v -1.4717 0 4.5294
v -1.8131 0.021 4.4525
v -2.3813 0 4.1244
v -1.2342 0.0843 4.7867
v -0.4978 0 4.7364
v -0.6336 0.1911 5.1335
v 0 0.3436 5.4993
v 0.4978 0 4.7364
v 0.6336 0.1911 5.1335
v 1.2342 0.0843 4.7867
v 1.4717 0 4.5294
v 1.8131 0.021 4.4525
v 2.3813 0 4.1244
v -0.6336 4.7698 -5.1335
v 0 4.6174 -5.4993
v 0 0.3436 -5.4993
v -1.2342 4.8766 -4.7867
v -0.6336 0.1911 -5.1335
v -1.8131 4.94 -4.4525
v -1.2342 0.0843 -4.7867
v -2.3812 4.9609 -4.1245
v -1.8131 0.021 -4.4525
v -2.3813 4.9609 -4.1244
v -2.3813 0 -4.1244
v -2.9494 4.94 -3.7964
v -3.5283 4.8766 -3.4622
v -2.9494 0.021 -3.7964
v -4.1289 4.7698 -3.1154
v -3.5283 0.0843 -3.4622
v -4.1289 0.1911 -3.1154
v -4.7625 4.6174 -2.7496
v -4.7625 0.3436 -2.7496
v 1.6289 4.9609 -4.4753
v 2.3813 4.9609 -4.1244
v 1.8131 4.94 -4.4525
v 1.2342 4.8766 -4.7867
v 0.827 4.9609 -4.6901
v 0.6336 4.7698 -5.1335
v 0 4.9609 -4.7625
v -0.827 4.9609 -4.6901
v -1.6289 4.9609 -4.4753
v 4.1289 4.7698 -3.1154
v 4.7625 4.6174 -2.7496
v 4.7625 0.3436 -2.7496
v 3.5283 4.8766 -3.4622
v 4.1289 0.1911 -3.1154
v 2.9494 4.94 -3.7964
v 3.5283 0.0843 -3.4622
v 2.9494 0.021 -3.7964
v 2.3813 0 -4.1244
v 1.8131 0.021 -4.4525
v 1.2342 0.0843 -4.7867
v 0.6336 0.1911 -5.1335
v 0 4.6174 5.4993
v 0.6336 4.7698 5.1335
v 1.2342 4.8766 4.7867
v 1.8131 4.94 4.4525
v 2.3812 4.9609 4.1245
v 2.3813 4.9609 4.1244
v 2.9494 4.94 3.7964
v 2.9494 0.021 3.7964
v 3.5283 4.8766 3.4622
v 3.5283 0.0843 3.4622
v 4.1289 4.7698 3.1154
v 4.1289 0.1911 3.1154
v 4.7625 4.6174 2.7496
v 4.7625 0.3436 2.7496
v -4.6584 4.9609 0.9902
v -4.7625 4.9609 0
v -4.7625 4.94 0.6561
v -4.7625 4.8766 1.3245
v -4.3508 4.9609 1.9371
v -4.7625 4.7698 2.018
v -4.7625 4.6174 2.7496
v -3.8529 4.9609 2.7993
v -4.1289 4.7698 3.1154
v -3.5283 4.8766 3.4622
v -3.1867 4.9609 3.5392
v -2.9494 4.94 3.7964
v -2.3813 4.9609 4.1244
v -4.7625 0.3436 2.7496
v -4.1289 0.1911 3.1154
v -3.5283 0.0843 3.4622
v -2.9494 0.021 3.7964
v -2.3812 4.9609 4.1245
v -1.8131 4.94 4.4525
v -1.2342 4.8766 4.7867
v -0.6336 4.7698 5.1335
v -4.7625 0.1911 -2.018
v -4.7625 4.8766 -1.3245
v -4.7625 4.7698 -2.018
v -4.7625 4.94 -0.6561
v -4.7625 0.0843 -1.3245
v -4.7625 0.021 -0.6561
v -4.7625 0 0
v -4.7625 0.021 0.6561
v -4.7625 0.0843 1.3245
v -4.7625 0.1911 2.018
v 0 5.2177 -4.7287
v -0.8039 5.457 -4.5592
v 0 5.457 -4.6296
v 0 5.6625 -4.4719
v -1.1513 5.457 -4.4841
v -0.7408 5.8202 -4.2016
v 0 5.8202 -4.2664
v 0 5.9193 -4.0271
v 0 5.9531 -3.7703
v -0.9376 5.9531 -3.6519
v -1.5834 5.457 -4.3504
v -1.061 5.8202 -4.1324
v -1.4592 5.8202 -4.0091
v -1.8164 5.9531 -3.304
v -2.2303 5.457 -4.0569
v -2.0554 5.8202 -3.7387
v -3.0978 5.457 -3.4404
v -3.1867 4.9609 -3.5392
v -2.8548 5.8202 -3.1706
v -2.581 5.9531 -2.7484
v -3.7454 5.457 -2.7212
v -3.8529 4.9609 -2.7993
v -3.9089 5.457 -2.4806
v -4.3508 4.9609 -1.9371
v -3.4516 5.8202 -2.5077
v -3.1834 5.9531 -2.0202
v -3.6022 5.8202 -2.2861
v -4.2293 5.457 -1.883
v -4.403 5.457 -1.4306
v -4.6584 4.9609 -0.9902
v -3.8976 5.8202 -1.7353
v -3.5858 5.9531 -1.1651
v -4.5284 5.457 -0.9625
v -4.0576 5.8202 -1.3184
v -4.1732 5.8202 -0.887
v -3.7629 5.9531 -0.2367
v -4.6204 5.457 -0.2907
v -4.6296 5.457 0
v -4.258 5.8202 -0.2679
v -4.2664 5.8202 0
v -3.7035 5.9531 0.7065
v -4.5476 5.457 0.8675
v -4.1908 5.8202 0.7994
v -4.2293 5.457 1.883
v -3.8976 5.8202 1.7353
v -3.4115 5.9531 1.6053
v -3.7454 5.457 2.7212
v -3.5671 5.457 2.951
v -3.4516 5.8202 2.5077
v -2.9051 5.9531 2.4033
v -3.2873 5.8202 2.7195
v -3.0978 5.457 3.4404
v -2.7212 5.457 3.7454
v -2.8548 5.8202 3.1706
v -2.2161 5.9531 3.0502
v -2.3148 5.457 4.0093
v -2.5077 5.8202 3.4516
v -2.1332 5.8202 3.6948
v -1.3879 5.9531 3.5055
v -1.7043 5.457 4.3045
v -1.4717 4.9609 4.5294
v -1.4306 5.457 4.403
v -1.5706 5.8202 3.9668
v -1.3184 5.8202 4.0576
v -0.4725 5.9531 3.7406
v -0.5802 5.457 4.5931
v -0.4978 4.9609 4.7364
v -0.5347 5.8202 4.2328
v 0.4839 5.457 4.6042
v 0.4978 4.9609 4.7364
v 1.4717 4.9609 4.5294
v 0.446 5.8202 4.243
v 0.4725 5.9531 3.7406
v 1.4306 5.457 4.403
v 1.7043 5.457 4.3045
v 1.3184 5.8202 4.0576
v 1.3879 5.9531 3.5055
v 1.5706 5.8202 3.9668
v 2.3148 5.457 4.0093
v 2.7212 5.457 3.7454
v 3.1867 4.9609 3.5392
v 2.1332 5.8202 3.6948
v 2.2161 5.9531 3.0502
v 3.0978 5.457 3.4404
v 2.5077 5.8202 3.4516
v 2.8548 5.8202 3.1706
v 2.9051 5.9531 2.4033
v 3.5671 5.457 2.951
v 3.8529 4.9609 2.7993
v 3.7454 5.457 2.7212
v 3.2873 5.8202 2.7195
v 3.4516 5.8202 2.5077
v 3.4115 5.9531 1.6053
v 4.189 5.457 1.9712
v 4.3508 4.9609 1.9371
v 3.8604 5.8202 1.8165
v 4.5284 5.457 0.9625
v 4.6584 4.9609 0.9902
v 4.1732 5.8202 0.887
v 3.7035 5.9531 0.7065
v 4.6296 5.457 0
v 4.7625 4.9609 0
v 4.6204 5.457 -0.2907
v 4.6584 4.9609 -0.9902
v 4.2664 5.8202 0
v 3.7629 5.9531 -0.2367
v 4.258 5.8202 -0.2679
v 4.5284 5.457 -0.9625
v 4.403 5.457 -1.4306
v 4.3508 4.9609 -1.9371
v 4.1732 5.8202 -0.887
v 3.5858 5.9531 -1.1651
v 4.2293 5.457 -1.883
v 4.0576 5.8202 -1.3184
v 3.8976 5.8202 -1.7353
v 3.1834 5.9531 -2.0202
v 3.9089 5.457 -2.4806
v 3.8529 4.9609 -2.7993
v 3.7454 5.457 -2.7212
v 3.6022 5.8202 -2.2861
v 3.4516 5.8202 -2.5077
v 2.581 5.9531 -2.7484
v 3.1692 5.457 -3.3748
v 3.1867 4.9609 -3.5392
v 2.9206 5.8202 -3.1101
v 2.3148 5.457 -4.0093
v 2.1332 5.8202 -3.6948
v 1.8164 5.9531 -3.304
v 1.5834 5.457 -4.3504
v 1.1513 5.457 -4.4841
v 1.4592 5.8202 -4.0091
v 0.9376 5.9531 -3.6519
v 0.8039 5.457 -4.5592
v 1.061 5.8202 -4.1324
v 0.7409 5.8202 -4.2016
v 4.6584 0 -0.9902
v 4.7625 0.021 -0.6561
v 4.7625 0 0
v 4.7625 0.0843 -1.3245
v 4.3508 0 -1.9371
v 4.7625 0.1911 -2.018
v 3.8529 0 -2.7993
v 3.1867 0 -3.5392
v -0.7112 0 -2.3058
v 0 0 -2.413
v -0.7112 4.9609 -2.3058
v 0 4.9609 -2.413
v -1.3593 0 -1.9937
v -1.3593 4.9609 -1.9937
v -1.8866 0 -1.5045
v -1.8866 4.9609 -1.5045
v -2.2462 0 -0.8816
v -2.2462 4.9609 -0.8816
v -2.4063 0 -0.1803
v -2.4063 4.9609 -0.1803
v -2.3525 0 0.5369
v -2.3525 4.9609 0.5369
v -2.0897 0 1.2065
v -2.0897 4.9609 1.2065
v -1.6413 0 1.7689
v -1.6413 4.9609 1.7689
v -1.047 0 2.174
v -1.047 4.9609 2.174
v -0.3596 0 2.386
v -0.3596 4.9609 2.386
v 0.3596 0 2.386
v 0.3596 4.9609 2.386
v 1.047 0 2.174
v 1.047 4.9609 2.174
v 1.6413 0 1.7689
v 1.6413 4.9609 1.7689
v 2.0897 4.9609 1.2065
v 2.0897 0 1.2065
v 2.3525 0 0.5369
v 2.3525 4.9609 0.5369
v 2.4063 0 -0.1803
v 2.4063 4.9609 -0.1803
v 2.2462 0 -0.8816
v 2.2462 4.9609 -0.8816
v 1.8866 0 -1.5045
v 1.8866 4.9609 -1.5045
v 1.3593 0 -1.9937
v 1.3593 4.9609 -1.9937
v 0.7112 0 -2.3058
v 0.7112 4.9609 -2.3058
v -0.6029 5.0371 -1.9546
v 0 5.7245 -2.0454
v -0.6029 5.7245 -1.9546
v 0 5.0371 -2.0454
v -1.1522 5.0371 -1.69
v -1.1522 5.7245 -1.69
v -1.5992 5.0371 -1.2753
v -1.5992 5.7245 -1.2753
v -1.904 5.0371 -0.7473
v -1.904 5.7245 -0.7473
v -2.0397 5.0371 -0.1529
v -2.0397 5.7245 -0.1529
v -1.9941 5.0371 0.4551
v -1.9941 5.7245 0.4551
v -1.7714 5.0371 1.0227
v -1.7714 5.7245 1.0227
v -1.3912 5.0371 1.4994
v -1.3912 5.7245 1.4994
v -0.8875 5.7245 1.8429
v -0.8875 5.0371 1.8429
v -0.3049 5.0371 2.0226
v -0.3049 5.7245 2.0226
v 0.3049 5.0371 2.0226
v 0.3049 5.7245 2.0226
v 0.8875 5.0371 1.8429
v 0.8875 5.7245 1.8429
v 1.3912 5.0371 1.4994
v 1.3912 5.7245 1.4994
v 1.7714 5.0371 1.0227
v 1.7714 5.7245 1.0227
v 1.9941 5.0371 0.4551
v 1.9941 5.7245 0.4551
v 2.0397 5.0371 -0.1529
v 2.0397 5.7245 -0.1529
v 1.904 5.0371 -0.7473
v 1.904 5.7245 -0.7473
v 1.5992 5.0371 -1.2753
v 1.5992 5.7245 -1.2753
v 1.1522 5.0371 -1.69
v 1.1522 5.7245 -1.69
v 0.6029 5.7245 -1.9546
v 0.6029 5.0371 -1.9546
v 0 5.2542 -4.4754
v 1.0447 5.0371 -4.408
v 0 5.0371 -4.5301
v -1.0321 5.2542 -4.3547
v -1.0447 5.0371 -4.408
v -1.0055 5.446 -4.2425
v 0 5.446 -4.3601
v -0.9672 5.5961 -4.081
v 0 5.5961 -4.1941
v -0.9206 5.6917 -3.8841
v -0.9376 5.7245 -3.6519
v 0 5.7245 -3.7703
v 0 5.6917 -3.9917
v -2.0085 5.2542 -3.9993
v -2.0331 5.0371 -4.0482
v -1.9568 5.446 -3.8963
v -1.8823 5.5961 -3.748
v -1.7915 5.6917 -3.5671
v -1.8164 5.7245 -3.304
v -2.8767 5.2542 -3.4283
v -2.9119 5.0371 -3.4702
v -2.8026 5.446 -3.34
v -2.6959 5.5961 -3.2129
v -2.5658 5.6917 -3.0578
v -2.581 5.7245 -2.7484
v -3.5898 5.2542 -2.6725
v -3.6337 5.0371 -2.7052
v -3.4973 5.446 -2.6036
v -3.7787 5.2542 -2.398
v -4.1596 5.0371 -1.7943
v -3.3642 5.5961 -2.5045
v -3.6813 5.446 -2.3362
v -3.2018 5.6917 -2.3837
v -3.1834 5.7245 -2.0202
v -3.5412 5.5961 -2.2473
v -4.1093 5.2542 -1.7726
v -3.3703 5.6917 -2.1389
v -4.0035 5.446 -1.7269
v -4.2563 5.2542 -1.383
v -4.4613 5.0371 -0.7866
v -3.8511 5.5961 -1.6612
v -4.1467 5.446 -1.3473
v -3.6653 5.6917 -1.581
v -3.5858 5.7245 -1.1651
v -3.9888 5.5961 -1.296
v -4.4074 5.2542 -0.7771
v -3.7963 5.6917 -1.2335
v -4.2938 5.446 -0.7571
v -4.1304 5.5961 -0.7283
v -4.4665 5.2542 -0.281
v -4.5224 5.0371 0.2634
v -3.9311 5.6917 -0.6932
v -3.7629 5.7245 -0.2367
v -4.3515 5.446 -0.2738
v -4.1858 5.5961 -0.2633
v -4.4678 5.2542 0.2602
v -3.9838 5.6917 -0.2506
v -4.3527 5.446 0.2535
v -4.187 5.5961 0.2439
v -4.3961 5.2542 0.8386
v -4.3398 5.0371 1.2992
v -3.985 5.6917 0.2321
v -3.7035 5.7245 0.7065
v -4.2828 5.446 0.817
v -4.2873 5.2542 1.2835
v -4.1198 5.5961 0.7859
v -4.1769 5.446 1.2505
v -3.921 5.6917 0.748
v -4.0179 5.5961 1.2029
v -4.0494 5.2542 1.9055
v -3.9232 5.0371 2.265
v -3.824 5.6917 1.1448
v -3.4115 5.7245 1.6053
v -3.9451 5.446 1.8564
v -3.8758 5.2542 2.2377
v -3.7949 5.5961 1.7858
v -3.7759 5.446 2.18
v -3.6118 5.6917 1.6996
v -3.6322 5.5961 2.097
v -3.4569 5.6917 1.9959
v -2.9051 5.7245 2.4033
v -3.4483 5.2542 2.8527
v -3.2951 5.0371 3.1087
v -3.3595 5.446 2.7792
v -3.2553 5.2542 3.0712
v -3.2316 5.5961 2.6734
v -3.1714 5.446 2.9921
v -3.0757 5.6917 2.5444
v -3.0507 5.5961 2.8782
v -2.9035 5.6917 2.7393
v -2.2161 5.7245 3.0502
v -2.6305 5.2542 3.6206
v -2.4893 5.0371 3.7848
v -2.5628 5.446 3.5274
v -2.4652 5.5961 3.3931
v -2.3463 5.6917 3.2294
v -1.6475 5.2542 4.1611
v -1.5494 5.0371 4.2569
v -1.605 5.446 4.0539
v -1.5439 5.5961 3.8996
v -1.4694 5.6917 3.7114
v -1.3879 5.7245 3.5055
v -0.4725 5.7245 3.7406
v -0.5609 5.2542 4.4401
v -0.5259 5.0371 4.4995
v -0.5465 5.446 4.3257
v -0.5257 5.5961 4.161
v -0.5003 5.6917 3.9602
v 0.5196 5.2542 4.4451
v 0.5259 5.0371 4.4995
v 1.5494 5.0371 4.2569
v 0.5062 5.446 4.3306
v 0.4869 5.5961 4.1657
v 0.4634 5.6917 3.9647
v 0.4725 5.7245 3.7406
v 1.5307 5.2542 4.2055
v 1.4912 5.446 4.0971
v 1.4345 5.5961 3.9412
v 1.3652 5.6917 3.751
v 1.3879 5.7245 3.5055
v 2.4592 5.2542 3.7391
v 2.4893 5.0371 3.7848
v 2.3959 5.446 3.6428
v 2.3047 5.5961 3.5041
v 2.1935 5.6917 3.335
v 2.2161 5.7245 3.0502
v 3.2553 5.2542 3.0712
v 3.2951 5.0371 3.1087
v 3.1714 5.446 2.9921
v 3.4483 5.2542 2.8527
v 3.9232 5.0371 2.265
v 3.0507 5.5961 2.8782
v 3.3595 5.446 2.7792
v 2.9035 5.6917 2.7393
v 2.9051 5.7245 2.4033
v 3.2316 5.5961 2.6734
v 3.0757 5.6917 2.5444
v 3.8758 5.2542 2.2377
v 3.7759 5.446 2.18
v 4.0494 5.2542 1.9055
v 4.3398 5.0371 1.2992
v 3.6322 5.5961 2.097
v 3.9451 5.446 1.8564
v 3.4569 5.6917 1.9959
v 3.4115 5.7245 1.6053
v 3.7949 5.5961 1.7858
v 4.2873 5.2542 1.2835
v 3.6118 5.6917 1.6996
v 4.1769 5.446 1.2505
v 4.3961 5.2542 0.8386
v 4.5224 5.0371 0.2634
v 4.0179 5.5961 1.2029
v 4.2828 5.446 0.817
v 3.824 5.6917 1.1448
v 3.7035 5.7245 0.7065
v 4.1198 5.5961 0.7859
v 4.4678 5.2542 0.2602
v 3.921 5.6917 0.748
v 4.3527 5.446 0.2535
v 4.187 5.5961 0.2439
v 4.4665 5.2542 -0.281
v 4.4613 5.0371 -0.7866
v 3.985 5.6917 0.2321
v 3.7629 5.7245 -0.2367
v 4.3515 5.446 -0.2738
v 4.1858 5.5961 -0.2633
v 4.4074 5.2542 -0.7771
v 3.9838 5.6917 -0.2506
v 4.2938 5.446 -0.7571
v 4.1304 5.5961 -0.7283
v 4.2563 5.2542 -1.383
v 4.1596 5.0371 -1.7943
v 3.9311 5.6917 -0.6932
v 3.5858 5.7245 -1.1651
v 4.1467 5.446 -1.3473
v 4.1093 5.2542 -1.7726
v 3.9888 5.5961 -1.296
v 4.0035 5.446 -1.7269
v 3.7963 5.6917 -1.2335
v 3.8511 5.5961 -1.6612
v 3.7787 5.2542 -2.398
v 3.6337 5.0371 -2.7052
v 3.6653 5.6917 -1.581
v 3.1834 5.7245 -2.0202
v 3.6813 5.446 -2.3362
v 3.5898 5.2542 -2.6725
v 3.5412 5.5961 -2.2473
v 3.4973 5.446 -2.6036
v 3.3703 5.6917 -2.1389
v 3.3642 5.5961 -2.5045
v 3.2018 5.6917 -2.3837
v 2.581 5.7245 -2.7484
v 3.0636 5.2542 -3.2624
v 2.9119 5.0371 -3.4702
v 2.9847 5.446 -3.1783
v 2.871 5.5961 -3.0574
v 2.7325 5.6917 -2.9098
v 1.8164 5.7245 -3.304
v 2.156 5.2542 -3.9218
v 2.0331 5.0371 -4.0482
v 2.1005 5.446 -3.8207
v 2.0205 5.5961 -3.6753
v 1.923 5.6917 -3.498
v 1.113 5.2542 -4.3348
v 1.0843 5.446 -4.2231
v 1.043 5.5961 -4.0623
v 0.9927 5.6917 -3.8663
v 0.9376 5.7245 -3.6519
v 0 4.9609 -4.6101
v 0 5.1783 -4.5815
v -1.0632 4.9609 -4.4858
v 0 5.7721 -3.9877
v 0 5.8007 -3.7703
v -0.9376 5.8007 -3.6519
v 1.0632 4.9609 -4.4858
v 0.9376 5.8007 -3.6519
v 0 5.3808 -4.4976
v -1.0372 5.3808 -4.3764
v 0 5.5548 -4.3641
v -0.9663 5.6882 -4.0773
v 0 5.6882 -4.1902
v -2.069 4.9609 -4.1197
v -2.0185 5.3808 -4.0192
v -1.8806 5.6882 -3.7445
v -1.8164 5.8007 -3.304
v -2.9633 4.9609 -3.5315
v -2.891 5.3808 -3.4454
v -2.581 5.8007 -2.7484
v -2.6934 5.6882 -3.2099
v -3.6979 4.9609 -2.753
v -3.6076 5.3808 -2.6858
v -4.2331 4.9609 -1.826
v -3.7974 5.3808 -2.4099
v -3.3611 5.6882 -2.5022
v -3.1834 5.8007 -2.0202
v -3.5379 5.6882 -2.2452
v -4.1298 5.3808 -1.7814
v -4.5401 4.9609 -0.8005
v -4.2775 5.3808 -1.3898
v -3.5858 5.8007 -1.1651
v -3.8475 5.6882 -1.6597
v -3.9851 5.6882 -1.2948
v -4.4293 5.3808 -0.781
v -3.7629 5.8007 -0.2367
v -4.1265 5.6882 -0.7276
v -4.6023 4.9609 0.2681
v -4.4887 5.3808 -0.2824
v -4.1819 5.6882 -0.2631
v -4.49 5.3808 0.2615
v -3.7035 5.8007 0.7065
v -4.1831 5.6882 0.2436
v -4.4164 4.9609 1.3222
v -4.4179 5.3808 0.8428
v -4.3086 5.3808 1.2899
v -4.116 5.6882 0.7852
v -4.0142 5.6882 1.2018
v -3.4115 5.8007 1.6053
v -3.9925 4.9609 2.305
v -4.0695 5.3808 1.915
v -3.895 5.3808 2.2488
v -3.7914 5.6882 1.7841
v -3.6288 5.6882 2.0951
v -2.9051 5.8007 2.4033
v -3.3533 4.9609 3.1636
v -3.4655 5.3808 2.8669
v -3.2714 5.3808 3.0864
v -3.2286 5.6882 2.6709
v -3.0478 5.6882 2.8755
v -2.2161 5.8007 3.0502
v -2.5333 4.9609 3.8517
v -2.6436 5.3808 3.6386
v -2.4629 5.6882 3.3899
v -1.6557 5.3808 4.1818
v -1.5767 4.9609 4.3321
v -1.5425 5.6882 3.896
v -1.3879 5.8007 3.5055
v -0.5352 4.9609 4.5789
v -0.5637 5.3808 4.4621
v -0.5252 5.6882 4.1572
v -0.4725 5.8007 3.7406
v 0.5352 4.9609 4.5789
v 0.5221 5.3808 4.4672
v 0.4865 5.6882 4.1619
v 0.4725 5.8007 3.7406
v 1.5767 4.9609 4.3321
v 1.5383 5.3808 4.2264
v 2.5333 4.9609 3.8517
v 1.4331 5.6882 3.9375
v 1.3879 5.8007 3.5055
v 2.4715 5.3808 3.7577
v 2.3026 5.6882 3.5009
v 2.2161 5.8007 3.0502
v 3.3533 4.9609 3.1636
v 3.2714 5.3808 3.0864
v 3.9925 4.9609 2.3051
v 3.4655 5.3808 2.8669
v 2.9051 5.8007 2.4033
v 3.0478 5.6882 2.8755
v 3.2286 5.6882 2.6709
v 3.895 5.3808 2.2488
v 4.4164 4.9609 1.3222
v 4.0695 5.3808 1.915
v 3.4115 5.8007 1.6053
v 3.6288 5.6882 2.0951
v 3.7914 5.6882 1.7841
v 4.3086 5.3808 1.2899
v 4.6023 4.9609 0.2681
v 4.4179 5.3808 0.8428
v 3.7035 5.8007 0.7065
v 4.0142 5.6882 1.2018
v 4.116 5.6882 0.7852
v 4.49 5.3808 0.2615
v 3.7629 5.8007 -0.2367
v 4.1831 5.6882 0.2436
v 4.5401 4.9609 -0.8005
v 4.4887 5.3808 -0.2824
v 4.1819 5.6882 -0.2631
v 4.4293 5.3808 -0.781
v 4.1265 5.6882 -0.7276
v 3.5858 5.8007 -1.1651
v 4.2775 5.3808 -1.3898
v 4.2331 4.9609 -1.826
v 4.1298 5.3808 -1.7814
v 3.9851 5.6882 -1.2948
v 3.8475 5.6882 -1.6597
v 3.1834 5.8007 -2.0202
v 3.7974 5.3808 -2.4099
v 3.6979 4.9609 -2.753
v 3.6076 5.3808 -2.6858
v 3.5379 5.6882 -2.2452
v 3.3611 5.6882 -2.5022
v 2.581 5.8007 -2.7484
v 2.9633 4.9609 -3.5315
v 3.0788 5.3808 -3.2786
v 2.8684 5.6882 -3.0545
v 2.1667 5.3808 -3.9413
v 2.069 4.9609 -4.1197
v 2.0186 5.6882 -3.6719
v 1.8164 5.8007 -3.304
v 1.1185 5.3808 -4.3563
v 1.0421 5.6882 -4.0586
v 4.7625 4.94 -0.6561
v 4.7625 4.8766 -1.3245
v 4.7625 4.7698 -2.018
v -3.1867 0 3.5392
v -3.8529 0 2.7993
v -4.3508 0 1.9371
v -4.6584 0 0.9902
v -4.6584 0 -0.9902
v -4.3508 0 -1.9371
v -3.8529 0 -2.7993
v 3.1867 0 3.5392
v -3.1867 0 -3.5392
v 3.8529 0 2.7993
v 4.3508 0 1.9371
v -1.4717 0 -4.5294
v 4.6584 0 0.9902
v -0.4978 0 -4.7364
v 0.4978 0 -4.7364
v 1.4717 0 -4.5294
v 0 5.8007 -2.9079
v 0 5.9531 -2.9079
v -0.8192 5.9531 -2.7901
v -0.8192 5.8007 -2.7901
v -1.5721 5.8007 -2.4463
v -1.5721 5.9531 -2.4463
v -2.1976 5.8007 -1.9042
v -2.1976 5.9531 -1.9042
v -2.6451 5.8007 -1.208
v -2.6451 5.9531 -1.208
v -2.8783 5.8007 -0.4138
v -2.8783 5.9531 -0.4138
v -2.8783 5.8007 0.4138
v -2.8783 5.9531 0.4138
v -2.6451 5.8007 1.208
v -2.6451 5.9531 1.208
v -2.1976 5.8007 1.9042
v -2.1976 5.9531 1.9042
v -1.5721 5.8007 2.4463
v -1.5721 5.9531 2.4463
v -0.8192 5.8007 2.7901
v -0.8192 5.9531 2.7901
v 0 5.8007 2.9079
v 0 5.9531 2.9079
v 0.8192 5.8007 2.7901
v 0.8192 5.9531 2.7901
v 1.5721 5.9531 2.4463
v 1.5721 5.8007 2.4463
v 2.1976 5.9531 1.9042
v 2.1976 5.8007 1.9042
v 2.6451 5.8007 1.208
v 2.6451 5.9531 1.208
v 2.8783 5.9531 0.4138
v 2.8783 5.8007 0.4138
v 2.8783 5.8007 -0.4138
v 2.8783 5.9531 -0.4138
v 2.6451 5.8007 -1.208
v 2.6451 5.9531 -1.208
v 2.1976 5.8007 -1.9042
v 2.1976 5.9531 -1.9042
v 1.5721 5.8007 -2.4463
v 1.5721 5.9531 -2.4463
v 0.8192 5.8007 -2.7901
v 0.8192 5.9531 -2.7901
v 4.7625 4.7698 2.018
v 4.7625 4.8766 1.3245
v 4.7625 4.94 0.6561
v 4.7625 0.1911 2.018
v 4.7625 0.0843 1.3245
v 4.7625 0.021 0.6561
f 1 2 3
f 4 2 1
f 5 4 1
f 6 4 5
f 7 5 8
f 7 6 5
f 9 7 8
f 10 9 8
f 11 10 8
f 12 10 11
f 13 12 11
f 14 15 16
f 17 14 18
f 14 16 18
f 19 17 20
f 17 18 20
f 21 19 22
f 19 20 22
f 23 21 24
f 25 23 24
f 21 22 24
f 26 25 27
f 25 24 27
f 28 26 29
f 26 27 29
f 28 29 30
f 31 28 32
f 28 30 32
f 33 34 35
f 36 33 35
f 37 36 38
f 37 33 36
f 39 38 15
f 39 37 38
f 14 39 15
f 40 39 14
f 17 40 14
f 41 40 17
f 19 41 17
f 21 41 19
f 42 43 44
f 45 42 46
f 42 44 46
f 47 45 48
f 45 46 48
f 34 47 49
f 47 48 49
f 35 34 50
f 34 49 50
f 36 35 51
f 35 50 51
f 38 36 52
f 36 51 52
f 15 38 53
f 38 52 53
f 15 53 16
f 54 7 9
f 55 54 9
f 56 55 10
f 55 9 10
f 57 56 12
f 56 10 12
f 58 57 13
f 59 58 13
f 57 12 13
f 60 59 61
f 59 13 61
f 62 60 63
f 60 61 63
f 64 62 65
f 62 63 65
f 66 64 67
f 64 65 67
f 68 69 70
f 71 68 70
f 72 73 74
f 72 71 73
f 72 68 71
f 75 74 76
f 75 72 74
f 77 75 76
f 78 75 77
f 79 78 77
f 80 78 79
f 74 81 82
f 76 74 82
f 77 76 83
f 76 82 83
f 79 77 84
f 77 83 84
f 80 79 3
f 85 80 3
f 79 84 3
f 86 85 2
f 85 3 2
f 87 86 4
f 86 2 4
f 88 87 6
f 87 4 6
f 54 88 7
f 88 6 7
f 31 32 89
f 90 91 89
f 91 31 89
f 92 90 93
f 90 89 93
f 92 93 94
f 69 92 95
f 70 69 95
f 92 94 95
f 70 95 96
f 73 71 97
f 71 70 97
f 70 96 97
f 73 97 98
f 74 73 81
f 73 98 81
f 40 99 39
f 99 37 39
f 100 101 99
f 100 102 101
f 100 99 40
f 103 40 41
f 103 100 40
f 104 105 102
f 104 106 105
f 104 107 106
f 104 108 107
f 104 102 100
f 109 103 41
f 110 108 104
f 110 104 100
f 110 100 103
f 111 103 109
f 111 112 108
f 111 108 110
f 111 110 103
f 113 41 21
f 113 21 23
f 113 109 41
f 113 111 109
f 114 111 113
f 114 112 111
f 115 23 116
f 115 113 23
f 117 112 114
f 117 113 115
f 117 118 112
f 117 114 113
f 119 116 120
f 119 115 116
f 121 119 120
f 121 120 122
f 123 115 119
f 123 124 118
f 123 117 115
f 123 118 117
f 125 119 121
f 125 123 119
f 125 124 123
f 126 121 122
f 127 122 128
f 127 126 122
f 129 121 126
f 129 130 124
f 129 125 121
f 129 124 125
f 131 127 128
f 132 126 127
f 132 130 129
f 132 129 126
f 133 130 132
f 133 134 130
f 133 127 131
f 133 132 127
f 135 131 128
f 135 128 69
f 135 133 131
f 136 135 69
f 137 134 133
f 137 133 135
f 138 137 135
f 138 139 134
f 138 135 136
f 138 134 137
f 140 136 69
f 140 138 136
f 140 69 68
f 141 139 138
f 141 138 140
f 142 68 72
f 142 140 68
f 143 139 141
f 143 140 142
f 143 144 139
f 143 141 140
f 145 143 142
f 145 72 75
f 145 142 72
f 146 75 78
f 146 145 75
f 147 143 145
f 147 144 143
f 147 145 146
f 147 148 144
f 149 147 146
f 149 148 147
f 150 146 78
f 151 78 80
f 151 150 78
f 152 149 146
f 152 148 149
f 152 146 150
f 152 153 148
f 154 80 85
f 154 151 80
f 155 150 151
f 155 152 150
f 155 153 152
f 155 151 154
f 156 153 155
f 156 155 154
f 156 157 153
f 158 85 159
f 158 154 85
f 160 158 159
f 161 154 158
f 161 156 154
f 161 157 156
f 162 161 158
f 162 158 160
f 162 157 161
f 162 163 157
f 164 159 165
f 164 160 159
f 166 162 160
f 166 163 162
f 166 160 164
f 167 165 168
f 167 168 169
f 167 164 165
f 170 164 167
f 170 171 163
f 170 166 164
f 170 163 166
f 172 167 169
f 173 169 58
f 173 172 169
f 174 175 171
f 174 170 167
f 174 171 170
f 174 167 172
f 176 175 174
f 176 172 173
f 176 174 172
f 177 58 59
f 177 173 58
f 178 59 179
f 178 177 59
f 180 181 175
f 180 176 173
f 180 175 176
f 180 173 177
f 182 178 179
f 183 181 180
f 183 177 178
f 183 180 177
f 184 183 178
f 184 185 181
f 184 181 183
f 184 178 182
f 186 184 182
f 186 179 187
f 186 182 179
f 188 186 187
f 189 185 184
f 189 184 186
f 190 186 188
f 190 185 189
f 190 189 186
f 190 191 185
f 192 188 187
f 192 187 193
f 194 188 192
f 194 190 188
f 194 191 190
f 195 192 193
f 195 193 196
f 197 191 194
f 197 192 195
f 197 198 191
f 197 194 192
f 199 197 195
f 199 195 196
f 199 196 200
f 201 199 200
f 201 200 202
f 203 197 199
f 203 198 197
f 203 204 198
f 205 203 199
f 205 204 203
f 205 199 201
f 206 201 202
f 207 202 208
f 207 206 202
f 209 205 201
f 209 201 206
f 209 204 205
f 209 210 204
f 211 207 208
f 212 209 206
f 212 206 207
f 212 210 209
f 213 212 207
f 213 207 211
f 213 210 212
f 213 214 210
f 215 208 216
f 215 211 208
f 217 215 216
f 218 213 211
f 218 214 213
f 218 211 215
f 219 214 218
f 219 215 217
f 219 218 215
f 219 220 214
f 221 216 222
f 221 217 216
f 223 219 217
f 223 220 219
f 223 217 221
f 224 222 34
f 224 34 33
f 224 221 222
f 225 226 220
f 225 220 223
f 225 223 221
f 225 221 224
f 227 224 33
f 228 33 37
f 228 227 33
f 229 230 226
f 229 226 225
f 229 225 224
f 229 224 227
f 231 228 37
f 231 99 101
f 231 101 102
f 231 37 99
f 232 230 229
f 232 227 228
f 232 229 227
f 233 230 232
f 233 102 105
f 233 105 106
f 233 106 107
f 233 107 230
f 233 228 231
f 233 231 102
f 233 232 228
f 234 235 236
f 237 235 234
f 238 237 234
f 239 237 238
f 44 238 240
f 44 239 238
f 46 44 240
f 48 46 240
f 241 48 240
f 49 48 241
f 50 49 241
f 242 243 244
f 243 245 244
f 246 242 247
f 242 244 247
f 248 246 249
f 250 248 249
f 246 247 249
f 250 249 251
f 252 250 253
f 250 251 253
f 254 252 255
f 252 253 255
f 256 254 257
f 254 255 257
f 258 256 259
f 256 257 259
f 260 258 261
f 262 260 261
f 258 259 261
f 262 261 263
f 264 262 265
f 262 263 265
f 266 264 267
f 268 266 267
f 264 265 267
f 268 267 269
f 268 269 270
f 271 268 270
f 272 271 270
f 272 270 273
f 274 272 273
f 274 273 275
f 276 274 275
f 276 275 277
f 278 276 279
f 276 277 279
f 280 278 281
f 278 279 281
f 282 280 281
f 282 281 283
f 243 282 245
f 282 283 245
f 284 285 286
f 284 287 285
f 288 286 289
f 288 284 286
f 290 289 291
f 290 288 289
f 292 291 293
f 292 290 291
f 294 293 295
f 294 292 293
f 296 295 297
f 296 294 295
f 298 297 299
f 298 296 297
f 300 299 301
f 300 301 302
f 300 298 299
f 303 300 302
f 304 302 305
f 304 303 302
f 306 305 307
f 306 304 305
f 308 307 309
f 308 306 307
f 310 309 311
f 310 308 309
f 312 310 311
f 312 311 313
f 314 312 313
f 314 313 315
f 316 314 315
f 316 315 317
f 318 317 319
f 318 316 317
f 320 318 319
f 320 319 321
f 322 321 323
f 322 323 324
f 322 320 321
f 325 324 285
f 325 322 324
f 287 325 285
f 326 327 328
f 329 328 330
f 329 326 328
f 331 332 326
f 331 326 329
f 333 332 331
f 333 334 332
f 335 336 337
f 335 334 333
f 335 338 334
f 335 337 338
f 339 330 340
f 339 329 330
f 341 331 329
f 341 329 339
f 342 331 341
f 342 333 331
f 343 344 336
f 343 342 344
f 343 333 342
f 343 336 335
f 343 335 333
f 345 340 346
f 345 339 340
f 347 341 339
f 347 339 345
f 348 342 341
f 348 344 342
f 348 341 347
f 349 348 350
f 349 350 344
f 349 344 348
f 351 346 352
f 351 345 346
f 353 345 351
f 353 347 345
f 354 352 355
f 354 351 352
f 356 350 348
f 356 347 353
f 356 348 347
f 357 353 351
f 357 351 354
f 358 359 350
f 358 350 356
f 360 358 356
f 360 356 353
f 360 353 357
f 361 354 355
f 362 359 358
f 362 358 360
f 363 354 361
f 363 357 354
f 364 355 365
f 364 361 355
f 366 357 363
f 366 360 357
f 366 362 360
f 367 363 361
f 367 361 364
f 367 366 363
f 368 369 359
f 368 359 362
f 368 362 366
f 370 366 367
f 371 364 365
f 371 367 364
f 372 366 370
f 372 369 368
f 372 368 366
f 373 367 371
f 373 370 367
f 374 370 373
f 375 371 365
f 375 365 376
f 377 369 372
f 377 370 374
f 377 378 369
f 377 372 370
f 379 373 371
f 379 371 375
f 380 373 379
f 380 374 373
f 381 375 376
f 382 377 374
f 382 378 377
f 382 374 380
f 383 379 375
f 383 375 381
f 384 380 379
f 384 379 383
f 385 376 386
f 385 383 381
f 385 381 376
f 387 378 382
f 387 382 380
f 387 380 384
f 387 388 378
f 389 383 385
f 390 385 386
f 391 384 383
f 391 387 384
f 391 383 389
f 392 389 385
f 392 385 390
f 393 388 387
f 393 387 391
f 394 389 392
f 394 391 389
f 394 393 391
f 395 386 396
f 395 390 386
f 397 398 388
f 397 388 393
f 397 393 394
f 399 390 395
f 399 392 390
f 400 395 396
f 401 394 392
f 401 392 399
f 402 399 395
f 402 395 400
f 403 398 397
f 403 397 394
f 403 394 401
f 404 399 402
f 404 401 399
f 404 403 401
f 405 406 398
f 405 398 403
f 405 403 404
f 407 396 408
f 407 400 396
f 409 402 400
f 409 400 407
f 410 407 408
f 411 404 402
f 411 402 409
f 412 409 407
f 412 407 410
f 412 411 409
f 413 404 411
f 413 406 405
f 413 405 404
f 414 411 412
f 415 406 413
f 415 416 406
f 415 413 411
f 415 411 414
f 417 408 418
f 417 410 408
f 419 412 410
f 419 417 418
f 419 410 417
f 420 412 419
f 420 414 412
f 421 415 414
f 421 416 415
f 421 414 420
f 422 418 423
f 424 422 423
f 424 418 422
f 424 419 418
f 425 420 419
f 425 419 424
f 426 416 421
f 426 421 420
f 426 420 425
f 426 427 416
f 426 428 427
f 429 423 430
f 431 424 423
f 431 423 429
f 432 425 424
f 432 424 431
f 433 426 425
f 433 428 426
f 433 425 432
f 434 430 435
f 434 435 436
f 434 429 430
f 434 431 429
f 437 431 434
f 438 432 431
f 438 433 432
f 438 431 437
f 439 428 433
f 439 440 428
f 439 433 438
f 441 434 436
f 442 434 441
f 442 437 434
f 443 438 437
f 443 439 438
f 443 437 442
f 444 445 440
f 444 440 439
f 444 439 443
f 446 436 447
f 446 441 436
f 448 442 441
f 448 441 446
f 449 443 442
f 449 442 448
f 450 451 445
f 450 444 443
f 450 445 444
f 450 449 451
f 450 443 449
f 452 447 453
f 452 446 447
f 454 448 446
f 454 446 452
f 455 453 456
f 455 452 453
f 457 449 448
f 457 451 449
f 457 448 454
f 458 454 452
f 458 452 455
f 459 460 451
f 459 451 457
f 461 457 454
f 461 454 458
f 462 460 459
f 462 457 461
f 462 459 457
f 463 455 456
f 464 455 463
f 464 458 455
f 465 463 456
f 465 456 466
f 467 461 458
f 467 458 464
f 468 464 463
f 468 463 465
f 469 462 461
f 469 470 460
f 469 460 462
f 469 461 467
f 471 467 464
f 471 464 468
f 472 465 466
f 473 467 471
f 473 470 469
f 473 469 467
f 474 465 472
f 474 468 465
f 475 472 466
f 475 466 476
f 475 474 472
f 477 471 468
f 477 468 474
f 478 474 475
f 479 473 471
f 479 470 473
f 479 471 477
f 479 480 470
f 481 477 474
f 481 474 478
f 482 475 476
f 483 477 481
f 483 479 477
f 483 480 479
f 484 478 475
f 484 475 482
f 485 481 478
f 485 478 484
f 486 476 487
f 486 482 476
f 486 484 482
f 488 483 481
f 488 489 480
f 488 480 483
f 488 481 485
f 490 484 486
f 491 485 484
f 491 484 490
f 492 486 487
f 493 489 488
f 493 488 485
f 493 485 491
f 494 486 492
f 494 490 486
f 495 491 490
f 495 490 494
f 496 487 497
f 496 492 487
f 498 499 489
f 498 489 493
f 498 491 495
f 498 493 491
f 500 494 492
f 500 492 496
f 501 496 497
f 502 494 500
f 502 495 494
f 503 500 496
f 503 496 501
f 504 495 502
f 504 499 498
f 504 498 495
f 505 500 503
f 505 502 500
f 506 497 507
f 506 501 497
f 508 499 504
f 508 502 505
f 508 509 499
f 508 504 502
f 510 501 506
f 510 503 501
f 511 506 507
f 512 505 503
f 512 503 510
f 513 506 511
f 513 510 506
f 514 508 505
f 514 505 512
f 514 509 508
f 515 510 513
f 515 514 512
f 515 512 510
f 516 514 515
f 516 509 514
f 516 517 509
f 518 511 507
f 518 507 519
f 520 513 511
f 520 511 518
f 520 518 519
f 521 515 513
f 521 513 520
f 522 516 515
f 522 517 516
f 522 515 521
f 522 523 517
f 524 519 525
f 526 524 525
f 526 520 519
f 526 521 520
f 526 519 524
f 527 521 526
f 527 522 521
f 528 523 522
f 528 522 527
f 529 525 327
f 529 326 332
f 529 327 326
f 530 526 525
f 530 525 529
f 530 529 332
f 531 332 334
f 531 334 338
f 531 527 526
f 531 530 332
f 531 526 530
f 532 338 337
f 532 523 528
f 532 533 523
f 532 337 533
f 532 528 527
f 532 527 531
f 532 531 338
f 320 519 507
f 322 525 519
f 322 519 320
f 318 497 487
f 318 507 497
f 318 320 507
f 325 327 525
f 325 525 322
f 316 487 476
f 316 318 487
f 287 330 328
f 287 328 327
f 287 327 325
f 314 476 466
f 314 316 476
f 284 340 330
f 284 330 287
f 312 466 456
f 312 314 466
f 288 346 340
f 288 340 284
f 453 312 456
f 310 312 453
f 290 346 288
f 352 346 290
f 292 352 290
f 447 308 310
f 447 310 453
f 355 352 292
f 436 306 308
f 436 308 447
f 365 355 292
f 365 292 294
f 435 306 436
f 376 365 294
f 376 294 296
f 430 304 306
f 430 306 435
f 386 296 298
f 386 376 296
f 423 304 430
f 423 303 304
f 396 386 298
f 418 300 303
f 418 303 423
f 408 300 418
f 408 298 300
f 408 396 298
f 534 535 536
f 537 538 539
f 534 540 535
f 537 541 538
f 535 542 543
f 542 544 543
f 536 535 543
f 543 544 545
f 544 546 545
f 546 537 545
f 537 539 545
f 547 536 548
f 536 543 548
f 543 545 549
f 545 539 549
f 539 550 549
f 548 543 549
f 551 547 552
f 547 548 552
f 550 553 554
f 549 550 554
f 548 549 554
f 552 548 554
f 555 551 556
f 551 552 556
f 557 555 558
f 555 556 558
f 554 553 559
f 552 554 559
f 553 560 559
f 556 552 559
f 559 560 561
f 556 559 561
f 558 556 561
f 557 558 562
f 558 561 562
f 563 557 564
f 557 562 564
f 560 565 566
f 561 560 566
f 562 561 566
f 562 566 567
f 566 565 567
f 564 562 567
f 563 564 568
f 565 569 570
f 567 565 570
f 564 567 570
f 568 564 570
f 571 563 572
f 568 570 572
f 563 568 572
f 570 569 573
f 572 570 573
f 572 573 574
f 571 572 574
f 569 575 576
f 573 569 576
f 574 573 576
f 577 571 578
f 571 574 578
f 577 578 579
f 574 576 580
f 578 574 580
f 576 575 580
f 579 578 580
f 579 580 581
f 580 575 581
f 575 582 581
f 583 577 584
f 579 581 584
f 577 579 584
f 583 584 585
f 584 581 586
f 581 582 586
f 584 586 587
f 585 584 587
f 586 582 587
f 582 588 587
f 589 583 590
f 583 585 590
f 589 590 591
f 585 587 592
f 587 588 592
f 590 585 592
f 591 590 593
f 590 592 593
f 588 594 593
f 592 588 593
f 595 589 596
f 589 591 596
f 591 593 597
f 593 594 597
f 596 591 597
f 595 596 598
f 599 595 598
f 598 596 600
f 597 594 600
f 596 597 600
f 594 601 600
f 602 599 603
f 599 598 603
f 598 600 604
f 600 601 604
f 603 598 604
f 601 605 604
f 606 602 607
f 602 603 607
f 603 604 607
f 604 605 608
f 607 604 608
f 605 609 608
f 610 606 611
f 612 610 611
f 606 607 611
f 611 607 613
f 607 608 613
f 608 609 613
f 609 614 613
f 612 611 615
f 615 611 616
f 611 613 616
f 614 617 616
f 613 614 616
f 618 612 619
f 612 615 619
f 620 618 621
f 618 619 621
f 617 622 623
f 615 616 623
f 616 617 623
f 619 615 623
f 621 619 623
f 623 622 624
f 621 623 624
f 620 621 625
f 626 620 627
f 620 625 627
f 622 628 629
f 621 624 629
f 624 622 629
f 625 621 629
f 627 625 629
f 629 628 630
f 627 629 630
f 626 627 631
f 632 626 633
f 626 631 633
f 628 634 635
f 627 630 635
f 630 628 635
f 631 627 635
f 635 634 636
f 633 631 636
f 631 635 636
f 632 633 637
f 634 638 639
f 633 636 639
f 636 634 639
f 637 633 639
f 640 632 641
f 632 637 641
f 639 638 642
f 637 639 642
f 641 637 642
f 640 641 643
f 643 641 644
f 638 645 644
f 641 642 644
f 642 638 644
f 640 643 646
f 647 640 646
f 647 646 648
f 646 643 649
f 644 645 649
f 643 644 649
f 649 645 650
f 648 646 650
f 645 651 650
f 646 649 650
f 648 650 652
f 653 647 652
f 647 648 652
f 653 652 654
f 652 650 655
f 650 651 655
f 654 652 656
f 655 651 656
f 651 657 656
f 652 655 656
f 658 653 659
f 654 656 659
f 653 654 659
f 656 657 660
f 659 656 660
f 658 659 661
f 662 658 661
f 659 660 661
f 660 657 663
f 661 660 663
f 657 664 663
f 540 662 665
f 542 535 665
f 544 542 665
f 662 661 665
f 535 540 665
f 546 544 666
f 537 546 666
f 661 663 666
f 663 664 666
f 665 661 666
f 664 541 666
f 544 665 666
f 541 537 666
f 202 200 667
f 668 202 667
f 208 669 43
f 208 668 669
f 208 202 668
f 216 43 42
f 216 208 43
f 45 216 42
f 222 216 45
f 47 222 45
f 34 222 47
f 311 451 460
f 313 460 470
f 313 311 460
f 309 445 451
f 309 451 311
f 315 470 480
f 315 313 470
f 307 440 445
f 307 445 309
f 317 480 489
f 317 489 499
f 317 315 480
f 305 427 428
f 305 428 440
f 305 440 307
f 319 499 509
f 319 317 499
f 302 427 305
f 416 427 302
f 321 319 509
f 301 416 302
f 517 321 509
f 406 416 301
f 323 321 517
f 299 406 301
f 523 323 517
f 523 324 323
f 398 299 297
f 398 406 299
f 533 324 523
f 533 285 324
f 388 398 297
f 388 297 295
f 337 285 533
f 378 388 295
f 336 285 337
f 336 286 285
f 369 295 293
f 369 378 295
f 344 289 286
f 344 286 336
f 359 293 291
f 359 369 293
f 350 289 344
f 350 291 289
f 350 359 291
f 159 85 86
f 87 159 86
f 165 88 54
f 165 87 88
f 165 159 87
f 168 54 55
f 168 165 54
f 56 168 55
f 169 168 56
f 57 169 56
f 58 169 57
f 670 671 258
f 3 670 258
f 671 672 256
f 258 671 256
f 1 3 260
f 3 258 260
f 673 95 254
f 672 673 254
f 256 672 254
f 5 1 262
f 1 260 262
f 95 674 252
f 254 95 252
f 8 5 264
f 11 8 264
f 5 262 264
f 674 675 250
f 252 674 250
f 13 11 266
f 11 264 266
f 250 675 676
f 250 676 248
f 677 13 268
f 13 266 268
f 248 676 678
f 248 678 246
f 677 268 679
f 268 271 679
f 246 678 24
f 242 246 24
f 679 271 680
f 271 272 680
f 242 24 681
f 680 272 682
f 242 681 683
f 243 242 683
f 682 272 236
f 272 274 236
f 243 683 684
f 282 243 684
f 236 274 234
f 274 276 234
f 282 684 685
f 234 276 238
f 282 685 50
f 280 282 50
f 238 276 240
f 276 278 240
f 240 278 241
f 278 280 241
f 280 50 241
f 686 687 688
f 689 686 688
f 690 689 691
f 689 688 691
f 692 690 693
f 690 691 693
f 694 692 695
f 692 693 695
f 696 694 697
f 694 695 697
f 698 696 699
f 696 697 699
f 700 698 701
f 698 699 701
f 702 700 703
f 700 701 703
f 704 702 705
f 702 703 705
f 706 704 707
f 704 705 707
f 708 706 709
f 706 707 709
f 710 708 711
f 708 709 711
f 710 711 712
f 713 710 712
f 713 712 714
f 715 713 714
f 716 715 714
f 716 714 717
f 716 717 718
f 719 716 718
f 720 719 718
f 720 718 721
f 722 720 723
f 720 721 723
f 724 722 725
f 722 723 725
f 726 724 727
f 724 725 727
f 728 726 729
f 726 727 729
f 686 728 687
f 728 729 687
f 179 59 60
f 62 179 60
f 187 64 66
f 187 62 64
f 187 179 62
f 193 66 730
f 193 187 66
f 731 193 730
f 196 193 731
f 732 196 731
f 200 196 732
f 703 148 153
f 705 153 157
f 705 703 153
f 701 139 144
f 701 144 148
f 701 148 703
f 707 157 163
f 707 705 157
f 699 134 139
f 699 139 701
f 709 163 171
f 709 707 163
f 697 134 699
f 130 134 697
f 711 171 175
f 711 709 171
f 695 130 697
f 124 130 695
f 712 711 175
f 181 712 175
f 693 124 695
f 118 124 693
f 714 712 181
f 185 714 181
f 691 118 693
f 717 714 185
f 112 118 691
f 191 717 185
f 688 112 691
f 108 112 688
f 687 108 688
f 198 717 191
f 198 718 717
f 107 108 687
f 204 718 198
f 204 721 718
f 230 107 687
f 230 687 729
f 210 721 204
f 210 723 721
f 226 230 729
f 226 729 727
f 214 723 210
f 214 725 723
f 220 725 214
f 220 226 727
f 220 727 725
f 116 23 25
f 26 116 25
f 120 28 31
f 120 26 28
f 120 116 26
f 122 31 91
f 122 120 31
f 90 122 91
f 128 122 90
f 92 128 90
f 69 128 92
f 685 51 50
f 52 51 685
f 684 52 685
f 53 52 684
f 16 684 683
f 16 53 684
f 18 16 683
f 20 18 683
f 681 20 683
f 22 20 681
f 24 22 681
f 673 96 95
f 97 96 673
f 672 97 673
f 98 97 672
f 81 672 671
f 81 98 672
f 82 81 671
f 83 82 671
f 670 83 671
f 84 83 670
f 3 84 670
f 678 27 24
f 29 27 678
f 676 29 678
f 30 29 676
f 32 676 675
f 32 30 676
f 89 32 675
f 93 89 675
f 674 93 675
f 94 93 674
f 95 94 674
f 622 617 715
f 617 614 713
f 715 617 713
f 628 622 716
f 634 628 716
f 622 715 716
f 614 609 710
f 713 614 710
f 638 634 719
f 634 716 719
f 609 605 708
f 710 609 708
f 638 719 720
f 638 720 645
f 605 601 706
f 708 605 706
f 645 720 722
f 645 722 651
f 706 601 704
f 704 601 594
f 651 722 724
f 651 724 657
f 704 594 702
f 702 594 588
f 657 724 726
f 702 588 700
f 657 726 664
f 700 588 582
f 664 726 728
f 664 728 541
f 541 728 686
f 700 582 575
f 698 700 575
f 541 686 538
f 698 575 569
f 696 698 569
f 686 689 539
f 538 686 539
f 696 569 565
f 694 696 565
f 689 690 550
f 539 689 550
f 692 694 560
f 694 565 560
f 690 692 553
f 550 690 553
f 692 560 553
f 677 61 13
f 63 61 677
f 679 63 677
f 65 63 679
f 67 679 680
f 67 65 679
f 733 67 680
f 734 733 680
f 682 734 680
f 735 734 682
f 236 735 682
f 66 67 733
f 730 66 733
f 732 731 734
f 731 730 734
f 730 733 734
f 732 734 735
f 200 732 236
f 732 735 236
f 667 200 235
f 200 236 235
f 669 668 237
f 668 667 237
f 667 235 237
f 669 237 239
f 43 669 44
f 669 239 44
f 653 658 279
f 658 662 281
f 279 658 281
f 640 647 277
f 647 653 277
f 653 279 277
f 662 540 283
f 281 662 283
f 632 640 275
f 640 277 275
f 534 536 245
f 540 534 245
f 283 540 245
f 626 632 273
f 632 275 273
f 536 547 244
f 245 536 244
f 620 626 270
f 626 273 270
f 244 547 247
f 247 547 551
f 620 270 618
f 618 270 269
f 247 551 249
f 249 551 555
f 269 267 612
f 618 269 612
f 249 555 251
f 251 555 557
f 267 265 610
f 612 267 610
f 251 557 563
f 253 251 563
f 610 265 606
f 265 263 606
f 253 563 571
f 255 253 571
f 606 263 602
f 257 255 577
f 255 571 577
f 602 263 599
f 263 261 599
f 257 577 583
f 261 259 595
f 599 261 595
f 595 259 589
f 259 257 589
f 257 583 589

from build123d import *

# Parameters (mm, degrees)
EXTRUDE1_DEPTH = 5.953125
SKETCH2_W      = 2.413
SKETCH2_H      = 5.953125


with BuildPart() as part:
    # Sketch1 → Extrude1 (new body)
    with BuildSketch(Plane(origin=(0, 0, 0), x_dir=(1, 0, 0), z_dir=(0, 1, 0))):
        Polygon((0, 5.499261314), (-4.7625, 2.749630657), (-4.7625, -2.749630657), (0, -5.499261314), (4.7625, -2.749630657), (4.7625, 2.749630657), align=None)
    extrude(amount=EXTRUDE1_DEPTH)

    # Sketch4 → Cut-Revolve2 (revolve, cut)
    with BuildSketch(Plane(origin=(0, 0, 0), x_dir=(0, 0, -1), z_dir=(1, 0, 0))):
        Polygon((0, 5.953125), (2.413, 5.953125), (2.045424837, 5.781721887), (2.045424837, 0.171403113), (2.413, 0), (0, 0), align=None)
    revolve(axis=Axis((0, 5.953125, 0), (0, 1, 0)), mode=Mode.SUBTRACT)


with BuildPart() as body_2:
    # Sketch2 → Revolve1 (revolve)
    with BuildSketch(Plane(origin=(0, 0, 0), x_dir=(0, 0, -1), z_dir=(1, 0, 0))):
        with Locations((1.2065, 2.9765625)):
            Rectangle(SKETCH2_W, SKETCH2_H)
    revolve(axis=Axis((0, -2.413, 0), (0, 1, 0)))


with BuildPart() as part_1:
    add(part.part)

    # Combine1: cut body 2
    add(body_2.part, mode=Mode.SUBTRACT)

    # Sketch5 → Cut-Revolve3 (revolve, cut)
    with BuildSketch(Plane(origin=(0, 0, 0), x_dir=(0, 0, -1), z_dir=(1, 0, 0))):
        with BuildLine():
            Line((0, 0), (4.7625, 0))
            Line((4.7625, 0), (5.499261314, 0.343557443))
            Line((5.499261314, 0.343557443), (5.499261314, 4.617380057))
            Line((5.499261314, 4.617380057), (4.7625, 4.9609375))
            ThreePointArc((4.7625, 4.9609375), (4.471895009, 5.662520009), (3.7703125, 5.953125))
            Line((3.7703125, 5.953125), (3.7703125, 7.223125))
            Line((3.7703125, 7.223125), (6.769261314, 7.223125))
            Line((6.769261314, 7.223125), (6.769261314, -1.27))
            Line((6.769261314, -1.27), (0, -1.27))
            Line((0, -1.27), (0, 0))
        make_face()
    revolve(axis=Axis((0, 0, 0), (0, 1, 0)), mode=Mode.SUBTRACT)

    # Sketch6 → Cut-Revolve4 (revolve, cut)
    with BuildSketch(Plane(origin=(0, 0, 0), x_dir=(0, 0, -1), z_dir=(1, 0, 0))):
        with BuildLine():
            Line((0, 4.9609375), (4.6101, 4.9609375))
            ThreePointArc((4.6101, 4.9609375), (4.364131936, 5.554756936), (3.7703125, 5.800725))
            Line((3.7703125, 5.800725), (2.907868669, 5.800725))
            Line((2.907868669, 5.800725), (2.907868669, 7.223125))
            Line((2.907868669, 7.223125), (0, 7.223125))
            Line((0, 7.223125), (0, 4.9609375))
        make_face()
    revolve(axis=Axis((0, 7.223125, 0), (0, 1, 0)), mode=Mode.SUBTRACT)


with BuildPart() as body_2_2:
    # Sketch7 → Revolve2 (revolve)
    with BuildSketch(Plane(origin=(0, 0, 0), x_dir=(0, 0, -1), z_dir=(1, 0, 0))):
        with BuildLine():
            Line((2.045424837, 5.0371375), (4.530088408, 5.0371375))
            ThreePointArc((4.530088408, 5.0371375), (4.282601726, 5.527175629), (3.7703125, 5.724525))
            Line((3.7703125, 5.724525), (2.045424837, 5.724525))
            Line((2.045424837, 5.724525), (2.045424837, 5.0371375))
        make_face()
    revolve(axis=Axis((0, 5.0371375, 0), (0, 1, 0)))


solid = Compound([part_1.part, body_2_2.part])
